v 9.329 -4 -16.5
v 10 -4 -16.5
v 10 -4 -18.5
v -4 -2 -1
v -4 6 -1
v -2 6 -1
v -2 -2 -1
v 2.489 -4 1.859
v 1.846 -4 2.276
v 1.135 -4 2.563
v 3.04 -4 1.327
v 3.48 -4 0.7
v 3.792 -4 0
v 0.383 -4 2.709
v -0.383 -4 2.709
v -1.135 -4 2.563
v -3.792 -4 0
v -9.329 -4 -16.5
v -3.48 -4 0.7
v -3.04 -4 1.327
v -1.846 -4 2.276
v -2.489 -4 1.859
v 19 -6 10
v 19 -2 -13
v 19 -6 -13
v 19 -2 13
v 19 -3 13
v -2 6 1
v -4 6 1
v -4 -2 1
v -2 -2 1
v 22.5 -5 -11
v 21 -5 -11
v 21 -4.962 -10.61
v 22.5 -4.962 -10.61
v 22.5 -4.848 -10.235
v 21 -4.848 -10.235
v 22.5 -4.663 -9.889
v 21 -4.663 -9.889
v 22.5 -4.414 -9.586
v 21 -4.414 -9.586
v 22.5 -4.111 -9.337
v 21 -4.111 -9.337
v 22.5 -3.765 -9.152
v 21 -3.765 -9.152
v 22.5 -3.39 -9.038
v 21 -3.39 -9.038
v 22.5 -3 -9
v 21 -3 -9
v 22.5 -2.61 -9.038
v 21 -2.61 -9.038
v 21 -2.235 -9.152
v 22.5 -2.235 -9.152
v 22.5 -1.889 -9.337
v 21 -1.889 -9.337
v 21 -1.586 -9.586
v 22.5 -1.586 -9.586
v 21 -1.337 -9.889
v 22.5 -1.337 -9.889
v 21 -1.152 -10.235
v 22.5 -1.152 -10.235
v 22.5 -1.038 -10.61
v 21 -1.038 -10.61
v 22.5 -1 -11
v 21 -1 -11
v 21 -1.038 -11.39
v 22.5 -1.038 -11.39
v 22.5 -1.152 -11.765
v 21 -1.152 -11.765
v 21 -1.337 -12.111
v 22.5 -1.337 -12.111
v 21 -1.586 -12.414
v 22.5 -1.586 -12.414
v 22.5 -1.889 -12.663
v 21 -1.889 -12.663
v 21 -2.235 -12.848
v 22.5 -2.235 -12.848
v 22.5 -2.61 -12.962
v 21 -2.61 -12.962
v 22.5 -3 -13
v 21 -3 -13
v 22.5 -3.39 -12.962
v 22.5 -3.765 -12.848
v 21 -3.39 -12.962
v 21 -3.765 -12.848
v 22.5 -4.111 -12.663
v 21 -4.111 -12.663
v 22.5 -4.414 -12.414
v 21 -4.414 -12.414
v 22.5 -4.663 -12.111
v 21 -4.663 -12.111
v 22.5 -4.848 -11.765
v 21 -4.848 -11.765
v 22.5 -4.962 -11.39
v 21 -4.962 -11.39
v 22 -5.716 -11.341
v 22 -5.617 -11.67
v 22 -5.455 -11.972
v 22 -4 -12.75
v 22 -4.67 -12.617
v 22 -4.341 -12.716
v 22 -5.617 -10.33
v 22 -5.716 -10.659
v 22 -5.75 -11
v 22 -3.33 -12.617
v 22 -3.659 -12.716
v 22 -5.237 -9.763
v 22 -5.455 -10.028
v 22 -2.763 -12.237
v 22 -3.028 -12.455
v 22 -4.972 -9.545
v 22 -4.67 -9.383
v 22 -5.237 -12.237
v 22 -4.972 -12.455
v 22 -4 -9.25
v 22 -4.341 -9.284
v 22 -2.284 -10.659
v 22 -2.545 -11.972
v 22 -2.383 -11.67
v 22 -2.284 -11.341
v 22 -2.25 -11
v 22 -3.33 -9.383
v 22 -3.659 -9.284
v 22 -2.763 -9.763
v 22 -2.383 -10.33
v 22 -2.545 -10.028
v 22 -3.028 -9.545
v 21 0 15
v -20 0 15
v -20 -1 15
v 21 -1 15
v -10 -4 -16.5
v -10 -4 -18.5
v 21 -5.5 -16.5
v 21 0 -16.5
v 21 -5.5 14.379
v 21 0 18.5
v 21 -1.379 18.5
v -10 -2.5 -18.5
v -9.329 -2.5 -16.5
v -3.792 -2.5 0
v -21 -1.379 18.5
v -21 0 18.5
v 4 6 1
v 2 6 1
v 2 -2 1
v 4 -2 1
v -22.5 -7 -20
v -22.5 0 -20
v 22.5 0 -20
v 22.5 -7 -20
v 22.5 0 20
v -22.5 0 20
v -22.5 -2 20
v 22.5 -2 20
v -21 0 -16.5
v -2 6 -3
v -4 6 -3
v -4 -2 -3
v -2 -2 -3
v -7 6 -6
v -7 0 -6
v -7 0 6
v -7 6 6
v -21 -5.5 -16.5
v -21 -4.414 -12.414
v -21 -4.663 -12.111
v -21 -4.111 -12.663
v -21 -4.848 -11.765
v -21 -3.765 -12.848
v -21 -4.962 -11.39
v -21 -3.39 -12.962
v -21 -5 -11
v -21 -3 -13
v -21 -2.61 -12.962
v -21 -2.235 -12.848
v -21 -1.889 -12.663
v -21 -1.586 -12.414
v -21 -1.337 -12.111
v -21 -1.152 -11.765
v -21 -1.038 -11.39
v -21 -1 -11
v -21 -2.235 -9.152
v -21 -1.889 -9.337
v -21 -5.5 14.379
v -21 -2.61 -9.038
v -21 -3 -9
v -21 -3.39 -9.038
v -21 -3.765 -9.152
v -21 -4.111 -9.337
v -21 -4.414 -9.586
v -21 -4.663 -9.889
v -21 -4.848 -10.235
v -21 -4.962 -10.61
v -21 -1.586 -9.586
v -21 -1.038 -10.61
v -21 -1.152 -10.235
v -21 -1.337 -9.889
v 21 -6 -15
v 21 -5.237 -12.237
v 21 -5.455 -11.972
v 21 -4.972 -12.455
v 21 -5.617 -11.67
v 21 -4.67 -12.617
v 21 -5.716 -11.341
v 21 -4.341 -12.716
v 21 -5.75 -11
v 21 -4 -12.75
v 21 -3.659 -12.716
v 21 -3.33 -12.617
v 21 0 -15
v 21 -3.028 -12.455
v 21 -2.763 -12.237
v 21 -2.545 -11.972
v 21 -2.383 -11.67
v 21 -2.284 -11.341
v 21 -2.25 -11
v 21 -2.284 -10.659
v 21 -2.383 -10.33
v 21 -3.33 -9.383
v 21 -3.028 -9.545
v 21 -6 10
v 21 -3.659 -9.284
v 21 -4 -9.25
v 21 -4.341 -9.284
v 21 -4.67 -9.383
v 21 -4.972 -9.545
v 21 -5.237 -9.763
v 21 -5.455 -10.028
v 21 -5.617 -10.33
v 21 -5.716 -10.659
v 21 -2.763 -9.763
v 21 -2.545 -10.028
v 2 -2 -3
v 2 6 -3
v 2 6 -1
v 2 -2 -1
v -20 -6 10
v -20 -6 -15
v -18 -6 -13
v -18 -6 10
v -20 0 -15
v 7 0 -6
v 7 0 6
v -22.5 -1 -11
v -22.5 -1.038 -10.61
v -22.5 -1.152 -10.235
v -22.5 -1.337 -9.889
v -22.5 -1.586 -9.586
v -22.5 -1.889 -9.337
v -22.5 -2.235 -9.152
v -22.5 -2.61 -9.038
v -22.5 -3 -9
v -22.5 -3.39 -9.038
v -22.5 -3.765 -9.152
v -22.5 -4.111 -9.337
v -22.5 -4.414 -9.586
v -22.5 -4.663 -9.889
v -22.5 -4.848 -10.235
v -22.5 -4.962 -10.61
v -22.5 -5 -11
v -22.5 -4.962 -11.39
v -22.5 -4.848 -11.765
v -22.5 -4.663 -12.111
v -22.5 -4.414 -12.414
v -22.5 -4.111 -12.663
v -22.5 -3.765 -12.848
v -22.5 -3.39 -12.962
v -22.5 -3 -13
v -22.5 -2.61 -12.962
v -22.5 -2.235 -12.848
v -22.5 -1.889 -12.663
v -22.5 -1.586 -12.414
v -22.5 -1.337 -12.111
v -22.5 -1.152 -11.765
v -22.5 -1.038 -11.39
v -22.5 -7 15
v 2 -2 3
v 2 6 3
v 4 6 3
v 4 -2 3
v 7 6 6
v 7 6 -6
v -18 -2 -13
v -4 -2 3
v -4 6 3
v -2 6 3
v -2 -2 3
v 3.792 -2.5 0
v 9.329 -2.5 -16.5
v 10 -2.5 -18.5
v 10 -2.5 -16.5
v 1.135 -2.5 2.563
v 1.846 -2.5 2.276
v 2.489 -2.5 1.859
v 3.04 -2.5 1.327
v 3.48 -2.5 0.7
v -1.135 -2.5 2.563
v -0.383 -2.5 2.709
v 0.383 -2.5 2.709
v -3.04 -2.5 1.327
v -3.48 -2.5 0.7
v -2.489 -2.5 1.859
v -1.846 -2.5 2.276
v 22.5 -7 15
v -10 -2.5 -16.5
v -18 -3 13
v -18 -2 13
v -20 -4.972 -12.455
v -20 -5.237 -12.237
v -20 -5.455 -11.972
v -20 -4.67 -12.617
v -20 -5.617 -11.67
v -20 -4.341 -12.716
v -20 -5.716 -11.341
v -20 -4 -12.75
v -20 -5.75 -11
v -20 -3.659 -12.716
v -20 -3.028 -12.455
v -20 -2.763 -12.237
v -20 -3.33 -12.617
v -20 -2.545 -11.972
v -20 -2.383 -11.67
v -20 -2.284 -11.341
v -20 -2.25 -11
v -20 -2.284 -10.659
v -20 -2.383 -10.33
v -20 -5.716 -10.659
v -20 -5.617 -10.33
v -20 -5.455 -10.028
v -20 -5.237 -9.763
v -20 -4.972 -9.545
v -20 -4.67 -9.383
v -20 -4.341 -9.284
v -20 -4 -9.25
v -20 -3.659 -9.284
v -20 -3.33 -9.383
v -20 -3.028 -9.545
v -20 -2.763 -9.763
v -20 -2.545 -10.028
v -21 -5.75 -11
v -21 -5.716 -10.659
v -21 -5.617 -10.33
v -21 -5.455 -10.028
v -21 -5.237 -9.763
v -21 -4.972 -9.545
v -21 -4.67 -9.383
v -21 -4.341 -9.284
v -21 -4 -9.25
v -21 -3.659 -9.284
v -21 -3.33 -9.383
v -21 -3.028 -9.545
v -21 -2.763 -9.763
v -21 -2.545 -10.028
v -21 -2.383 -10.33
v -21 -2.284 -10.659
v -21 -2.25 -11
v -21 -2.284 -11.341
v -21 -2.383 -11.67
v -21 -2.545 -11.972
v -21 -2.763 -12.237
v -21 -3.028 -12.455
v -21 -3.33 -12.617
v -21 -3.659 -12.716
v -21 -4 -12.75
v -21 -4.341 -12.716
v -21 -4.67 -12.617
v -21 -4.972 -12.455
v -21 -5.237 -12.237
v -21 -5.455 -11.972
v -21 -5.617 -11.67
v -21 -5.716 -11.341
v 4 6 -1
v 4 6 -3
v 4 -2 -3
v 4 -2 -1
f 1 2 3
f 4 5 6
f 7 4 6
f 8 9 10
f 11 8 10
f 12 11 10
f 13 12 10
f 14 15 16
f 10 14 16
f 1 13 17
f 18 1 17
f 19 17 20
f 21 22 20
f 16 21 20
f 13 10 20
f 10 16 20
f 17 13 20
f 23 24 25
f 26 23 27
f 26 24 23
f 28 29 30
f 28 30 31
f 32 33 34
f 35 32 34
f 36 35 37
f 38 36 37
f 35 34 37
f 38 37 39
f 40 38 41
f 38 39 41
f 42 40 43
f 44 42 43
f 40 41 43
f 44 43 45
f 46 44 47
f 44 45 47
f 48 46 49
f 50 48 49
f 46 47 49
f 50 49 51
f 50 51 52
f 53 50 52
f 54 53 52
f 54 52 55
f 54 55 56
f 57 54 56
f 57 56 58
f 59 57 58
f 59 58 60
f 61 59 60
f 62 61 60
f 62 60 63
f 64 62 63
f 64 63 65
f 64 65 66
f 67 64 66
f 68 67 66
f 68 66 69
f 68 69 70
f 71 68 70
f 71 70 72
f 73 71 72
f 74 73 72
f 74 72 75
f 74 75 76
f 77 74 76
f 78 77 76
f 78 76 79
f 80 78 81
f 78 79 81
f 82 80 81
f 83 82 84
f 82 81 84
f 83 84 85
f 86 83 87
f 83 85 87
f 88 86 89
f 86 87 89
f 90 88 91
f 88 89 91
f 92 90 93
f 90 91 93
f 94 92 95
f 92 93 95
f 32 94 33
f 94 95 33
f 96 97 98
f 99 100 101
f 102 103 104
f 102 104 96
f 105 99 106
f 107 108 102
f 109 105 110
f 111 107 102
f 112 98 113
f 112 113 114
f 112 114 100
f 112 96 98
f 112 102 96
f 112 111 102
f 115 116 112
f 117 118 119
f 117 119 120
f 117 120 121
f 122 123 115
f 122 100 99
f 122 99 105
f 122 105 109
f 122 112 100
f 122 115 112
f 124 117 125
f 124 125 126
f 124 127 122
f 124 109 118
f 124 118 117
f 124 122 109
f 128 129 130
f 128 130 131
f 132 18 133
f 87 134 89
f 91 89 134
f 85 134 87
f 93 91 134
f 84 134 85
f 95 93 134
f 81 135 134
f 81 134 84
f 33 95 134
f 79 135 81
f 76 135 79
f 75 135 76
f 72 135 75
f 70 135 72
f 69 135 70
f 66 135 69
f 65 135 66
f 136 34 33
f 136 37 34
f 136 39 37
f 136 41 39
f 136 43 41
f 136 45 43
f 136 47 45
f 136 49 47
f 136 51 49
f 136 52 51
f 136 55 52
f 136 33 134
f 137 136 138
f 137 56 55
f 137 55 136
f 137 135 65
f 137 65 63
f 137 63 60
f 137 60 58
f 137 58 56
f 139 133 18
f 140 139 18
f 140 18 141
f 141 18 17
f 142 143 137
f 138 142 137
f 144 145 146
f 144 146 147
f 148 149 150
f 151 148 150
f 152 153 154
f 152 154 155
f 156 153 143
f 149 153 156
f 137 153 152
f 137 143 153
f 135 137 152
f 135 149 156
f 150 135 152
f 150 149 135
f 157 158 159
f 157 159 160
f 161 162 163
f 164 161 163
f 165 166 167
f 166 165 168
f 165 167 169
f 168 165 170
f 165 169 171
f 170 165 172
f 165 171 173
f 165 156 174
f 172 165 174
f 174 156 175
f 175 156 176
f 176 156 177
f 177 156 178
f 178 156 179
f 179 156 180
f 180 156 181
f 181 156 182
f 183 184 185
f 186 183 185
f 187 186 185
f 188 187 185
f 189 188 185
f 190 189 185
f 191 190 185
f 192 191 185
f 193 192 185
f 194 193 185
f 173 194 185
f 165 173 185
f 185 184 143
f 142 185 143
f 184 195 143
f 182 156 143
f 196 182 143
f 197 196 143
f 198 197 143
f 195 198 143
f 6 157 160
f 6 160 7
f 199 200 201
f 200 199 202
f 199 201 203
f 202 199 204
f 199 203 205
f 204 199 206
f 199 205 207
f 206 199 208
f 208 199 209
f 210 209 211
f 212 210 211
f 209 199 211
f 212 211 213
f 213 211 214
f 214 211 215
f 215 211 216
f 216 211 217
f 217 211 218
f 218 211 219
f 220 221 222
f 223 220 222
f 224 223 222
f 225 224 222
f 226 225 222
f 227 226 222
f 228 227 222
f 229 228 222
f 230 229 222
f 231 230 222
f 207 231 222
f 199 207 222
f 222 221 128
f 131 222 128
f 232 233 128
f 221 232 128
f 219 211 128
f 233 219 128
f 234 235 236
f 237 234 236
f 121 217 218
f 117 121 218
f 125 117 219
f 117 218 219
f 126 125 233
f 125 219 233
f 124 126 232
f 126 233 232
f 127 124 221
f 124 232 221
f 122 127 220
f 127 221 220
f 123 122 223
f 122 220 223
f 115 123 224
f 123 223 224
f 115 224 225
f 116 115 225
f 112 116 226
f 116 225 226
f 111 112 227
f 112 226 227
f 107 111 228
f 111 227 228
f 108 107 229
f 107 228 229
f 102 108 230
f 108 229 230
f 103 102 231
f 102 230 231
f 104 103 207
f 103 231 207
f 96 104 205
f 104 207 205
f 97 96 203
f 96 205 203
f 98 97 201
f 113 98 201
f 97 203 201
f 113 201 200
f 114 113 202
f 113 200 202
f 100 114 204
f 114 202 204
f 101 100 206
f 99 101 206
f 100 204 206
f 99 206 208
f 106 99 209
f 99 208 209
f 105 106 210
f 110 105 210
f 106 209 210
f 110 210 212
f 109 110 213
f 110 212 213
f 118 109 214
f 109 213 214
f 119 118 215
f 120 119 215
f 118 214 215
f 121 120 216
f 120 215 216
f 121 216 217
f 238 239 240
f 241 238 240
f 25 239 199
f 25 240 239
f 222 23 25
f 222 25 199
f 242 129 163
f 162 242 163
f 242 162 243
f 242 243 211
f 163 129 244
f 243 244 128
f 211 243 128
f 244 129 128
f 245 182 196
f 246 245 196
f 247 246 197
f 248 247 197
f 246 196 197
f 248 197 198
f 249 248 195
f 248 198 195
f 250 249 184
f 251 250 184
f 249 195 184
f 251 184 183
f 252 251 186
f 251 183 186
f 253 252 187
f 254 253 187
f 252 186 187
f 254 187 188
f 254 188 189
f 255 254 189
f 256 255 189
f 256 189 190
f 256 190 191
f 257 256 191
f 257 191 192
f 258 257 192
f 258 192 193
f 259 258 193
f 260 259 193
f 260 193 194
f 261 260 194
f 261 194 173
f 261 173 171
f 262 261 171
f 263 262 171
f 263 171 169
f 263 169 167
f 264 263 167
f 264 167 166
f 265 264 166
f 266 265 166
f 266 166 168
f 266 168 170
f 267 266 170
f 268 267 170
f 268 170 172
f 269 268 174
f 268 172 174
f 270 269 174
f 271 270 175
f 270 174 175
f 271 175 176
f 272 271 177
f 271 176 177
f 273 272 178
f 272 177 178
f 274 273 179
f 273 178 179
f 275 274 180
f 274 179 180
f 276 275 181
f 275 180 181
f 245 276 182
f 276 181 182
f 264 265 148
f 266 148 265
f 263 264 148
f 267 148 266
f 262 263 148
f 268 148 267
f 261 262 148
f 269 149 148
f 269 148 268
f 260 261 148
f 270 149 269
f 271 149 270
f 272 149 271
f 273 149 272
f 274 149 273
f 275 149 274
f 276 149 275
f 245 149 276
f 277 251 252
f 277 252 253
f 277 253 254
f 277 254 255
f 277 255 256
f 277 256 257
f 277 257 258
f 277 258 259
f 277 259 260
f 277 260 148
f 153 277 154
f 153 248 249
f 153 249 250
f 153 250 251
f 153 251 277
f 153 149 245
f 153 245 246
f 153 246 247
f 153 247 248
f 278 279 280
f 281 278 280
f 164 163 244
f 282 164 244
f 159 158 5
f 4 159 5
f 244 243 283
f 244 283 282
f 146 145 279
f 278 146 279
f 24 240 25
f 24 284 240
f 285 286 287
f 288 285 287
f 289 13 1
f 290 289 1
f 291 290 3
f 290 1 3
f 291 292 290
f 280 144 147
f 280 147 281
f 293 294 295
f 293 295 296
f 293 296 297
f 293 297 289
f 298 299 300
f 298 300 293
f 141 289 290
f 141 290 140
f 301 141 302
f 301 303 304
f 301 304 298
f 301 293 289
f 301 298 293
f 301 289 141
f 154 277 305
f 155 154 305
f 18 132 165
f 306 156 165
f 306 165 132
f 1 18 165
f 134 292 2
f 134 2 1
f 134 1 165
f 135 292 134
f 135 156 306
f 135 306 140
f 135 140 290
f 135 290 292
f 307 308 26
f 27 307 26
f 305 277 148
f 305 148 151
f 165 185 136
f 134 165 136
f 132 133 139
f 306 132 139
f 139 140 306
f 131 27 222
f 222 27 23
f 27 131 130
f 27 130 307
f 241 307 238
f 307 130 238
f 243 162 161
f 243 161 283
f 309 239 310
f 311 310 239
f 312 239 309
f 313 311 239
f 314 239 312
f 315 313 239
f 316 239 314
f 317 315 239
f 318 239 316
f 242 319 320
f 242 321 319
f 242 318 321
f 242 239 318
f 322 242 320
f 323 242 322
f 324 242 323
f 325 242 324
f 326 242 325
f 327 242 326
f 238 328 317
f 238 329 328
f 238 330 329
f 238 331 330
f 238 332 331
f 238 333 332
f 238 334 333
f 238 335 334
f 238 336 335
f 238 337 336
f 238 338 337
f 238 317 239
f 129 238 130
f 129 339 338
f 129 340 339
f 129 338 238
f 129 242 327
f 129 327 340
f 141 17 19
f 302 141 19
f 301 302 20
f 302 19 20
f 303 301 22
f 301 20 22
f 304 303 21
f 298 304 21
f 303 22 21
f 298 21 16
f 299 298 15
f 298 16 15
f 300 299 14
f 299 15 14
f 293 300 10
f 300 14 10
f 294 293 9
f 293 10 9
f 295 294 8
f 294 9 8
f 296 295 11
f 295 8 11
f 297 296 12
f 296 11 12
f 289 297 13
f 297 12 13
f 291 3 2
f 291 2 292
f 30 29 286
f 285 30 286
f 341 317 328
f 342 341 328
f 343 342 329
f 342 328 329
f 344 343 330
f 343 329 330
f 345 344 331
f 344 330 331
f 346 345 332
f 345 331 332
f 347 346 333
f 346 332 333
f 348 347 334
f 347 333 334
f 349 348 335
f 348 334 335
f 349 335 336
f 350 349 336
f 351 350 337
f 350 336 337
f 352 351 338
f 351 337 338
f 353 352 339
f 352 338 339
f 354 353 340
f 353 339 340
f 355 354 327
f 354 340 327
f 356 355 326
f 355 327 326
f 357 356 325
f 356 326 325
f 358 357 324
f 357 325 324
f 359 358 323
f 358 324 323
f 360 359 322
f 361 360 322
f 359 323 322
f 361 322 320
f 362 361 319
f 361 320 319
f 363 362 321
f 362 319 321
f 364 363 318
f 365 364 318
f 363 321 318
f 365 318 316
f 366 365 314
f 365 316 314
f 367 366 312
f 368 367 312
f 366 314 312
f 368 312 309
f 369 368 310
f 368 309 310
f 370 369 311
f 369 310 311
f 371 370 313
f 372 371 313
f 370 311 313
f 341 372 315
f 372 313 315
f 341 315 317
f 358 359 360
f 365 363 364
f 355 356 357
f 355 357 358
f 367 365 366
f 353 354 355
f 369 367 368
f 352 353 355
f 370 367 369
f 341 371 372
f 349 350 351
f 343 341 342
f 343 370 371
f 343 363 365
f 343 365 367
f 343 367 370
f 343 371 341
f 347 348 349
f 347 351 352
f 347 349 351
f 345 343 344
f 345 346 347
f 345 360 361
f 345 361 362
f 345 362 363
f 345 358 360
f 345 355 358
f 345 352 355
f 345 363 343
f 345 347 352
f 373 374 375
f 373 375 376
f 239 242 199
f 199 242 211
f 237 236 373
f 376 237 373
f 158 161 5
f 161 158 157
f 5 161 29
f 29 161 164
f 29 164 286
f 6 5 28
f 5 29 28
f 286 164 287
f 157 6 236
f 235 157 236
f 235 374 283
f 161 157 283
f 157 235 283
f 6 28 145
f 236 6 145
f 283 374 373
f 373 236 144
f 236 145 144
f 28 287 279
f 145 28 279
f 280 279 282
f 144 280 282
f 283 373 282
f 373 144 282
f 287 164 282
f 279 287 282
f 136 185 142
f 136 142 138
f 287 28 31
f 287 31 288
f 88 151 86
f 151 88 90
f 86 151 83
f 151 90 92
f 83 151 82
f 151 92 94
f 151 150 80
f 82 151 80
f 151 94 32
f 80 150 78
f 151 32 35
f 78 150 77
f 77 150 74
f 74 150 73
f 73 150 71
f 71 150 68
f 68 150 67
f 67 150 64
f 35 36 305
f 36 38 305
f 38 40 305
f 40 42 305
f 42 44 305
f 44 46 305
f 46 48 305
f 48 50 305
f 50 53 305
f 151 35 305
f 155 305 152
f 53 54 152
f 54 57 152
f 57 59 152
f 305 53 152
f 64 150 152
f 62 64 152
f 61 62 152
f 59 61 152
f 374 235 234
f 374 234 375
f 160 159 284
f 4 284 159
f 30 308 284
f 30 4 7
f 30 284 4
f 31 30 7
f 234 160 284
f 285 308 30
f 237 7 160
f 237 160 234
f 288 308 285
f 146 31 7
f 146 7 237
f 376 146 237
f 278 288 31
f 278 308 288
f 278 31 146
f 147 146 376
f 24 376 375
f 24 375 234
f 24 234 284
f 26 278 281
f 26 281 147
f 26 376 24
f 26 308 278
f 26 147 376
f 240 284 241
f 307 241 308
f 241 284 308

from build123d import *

# Parameters (mm, degrees)
F0_W         = 41
F0_H         = 30
F1_DEPTH     = 6
F2_T         = -2
F3_W         = 2
F3_H         = 2
F4_DEPTH     = 10
F5_R         = 1.75
F6_DEPTH     = 1
F7_R         = 1.75
F8_DEPTH     = 1
F9_W         = 45
F9_H         = 40
F10_DEPTH    = 7
F11_SIZE     = 5
F12_T        = -1.5
F13_T1_DEPTH = 66.7168298797
F16_DEPTH    = 1.5
F17_R        = 2
F18_DEPTH    = 25
F19_R        = 2
F20_DEPTH    = 25
F21_DEPTH    = 2
F22_W        = 14
F22_H        = 12
F22_W_2      = 2
F22_H_2      = 2
F23_DEPTH    = 8


# Not quite as in the source:
# - a fillet or chamfer that OpenCascade refuses, or shapes differently, is made with other operations: its cross-section is extruded or revolved along the edge and cut away or added
# - a feature names something its author has since deleted; it is built from what else it names


with BuildPart() as f1:
    # F0 (on Front) → F1 (new body)
    with BuildSketch(Plane.XZ):
        with Locations((0.5, 0)):
            Rectangle(F0_W, F0_H)
    extrude(amount=F1_DEPTH)

    # F2
    f2_openings = [f1.faces().sort_by_distance(p)[0] for p in [
        (0.5, -6, 0),
    ]]
    offset(amount=F2_T, openings=f2_openings)

    # F3 (on face) → F4 (cut)
    with BuildSketch(Plane.XZ):
        with Locations((-3, -2)):
            Rectangle(F3_W, F3_H)
        with Locations((3, -2)):
            Rectangle(F3_W, F3_H)
        with Locations((3, 2)):
            Rectangle(F3_W, F3_H)
        with Locations((-3, 2)):
            Rectangle(F3_W, F3_H)
    extrude(amount=F4_DEPTH, mode=Mode.SUBTRACT)

    # F5 (on face) → F6 (join)
    with BuildSketch(Plane.YZ.offset(21)):
        with Locations((-4, -11)):
            Circle(F5_R)
    extrude(amount=F6_DEPTH)

    # F7 (on face) → F8 (join)
    with BuildSketch(Plane(origin=(-20, 0, 0), x_dir=(0, -1, 0), z_dir=(-1, 0, 0))):
        with Locations((4, -11)):
            Circle(F7_R)
    extrude(amount=F8_DEPTH)

    # F13: chamfer of 5 on 1 edges, made by hand

    # F13_s2 → F13_t1 (cut)
    with BuildSketch(Plane.YZ.offset(-32.8584149398)):
        Polygon((-1, 15), (-6, 10), (-6, 15), align=None)
    extrude(amount=F13_T1_DEPTH, mode=Mode.SUBTRACT)

    # F22 (on face) → F23 (join)
    with BuildSketch(Plane.XZ.offset(2)):
        Rectangle(F22_W, F22_H)
        with Locations((-3, -2)):
            Rectangle(F22_W_2, F22_H_2, mode=Mode.SUBTRACT)
        with Locations((3, -2)):
            Rectangle(F22_W_2, F22_H_2, mode=Mode.SUBTRACT)
        with Locations((-3, 2)):
            Rectangle(F22_W_2, F22_H_2, mode=Mode.SUBTRACT)
        with Locations((3, 2)):
            Rectangle(F22_W_2, F22_H_2, mode=Mode.SUBTRACT)
    extrude(amount=-F23_DEPTH)


with BuildPart() as f10:
    # F9 (on Front) → F10 (new body)
    with BuildSketch(Plane.XZ):
        Rectangle(F9_W, F9_H)
    extrude(amount=F10_DEPTH)

    # F11
    f11_edges = [f10.edges().sort_by_distance(p)[0] for p in [
        (0, -7, 20),
    ]]
    chamfer(f11_edges, length=F11_SIZE)

    # F12
    f12_openings = [f10.faces().sort_by_distance(p)[0] for p in [
        (0, 0, 0),
    ]]
    offset(amount=F12_T, openings=f12_openings)

    # F15 (on offset) → F16 (join)
    with BuildSketch(Plane(origin=(0, -4, 0), x_dir=(-1, 0, 0), z_dir=(0, 1, 0))):
        with BuildLine():
            Line((-10, -18.5), (10, -18.5))
            Line((10, -18.5), (3.7921958509, 0))
            ThreePointArc((3.7921958509, 0), (0, 2.7275022088), (-3.7921958509, 0))
            Line((-3.7921958509, 0), (-10, -18.5))
        make_face()
    extrude(amount=F16_DEPTH)

    # F17 (on face) → F18 (cut)
    with BuildSketch(Plane.YZ.offset(-21)):
        with Locations((-3, -11)):
            Circle(F17_R)
    extrude(amount=-F18_DEPTH, mode=Mode.SUBTRACT)

    # F19 (on face) → F20 (cut)
    with BuildSketch(Plane(origin=(21, 0, 0), x_dir=(0, -1, 0), z_dir=(-1, 0, 0))):
        with Locations((3, -11)):
            Circle(F19_R)
    extrude(amount=-F20_DEPTH, mode=Mode.SUBTRACT)

    # F21 (add): a face of the model
    f21_faces = [f10.faces().sort_by_distance(p)[0] for p in [
        (0, -0.4235858827, -18.5),
    ]]
    extrude(f21_faces, amount=F21_DEPTH)


solid = Compound([f1.part, f10.part])
